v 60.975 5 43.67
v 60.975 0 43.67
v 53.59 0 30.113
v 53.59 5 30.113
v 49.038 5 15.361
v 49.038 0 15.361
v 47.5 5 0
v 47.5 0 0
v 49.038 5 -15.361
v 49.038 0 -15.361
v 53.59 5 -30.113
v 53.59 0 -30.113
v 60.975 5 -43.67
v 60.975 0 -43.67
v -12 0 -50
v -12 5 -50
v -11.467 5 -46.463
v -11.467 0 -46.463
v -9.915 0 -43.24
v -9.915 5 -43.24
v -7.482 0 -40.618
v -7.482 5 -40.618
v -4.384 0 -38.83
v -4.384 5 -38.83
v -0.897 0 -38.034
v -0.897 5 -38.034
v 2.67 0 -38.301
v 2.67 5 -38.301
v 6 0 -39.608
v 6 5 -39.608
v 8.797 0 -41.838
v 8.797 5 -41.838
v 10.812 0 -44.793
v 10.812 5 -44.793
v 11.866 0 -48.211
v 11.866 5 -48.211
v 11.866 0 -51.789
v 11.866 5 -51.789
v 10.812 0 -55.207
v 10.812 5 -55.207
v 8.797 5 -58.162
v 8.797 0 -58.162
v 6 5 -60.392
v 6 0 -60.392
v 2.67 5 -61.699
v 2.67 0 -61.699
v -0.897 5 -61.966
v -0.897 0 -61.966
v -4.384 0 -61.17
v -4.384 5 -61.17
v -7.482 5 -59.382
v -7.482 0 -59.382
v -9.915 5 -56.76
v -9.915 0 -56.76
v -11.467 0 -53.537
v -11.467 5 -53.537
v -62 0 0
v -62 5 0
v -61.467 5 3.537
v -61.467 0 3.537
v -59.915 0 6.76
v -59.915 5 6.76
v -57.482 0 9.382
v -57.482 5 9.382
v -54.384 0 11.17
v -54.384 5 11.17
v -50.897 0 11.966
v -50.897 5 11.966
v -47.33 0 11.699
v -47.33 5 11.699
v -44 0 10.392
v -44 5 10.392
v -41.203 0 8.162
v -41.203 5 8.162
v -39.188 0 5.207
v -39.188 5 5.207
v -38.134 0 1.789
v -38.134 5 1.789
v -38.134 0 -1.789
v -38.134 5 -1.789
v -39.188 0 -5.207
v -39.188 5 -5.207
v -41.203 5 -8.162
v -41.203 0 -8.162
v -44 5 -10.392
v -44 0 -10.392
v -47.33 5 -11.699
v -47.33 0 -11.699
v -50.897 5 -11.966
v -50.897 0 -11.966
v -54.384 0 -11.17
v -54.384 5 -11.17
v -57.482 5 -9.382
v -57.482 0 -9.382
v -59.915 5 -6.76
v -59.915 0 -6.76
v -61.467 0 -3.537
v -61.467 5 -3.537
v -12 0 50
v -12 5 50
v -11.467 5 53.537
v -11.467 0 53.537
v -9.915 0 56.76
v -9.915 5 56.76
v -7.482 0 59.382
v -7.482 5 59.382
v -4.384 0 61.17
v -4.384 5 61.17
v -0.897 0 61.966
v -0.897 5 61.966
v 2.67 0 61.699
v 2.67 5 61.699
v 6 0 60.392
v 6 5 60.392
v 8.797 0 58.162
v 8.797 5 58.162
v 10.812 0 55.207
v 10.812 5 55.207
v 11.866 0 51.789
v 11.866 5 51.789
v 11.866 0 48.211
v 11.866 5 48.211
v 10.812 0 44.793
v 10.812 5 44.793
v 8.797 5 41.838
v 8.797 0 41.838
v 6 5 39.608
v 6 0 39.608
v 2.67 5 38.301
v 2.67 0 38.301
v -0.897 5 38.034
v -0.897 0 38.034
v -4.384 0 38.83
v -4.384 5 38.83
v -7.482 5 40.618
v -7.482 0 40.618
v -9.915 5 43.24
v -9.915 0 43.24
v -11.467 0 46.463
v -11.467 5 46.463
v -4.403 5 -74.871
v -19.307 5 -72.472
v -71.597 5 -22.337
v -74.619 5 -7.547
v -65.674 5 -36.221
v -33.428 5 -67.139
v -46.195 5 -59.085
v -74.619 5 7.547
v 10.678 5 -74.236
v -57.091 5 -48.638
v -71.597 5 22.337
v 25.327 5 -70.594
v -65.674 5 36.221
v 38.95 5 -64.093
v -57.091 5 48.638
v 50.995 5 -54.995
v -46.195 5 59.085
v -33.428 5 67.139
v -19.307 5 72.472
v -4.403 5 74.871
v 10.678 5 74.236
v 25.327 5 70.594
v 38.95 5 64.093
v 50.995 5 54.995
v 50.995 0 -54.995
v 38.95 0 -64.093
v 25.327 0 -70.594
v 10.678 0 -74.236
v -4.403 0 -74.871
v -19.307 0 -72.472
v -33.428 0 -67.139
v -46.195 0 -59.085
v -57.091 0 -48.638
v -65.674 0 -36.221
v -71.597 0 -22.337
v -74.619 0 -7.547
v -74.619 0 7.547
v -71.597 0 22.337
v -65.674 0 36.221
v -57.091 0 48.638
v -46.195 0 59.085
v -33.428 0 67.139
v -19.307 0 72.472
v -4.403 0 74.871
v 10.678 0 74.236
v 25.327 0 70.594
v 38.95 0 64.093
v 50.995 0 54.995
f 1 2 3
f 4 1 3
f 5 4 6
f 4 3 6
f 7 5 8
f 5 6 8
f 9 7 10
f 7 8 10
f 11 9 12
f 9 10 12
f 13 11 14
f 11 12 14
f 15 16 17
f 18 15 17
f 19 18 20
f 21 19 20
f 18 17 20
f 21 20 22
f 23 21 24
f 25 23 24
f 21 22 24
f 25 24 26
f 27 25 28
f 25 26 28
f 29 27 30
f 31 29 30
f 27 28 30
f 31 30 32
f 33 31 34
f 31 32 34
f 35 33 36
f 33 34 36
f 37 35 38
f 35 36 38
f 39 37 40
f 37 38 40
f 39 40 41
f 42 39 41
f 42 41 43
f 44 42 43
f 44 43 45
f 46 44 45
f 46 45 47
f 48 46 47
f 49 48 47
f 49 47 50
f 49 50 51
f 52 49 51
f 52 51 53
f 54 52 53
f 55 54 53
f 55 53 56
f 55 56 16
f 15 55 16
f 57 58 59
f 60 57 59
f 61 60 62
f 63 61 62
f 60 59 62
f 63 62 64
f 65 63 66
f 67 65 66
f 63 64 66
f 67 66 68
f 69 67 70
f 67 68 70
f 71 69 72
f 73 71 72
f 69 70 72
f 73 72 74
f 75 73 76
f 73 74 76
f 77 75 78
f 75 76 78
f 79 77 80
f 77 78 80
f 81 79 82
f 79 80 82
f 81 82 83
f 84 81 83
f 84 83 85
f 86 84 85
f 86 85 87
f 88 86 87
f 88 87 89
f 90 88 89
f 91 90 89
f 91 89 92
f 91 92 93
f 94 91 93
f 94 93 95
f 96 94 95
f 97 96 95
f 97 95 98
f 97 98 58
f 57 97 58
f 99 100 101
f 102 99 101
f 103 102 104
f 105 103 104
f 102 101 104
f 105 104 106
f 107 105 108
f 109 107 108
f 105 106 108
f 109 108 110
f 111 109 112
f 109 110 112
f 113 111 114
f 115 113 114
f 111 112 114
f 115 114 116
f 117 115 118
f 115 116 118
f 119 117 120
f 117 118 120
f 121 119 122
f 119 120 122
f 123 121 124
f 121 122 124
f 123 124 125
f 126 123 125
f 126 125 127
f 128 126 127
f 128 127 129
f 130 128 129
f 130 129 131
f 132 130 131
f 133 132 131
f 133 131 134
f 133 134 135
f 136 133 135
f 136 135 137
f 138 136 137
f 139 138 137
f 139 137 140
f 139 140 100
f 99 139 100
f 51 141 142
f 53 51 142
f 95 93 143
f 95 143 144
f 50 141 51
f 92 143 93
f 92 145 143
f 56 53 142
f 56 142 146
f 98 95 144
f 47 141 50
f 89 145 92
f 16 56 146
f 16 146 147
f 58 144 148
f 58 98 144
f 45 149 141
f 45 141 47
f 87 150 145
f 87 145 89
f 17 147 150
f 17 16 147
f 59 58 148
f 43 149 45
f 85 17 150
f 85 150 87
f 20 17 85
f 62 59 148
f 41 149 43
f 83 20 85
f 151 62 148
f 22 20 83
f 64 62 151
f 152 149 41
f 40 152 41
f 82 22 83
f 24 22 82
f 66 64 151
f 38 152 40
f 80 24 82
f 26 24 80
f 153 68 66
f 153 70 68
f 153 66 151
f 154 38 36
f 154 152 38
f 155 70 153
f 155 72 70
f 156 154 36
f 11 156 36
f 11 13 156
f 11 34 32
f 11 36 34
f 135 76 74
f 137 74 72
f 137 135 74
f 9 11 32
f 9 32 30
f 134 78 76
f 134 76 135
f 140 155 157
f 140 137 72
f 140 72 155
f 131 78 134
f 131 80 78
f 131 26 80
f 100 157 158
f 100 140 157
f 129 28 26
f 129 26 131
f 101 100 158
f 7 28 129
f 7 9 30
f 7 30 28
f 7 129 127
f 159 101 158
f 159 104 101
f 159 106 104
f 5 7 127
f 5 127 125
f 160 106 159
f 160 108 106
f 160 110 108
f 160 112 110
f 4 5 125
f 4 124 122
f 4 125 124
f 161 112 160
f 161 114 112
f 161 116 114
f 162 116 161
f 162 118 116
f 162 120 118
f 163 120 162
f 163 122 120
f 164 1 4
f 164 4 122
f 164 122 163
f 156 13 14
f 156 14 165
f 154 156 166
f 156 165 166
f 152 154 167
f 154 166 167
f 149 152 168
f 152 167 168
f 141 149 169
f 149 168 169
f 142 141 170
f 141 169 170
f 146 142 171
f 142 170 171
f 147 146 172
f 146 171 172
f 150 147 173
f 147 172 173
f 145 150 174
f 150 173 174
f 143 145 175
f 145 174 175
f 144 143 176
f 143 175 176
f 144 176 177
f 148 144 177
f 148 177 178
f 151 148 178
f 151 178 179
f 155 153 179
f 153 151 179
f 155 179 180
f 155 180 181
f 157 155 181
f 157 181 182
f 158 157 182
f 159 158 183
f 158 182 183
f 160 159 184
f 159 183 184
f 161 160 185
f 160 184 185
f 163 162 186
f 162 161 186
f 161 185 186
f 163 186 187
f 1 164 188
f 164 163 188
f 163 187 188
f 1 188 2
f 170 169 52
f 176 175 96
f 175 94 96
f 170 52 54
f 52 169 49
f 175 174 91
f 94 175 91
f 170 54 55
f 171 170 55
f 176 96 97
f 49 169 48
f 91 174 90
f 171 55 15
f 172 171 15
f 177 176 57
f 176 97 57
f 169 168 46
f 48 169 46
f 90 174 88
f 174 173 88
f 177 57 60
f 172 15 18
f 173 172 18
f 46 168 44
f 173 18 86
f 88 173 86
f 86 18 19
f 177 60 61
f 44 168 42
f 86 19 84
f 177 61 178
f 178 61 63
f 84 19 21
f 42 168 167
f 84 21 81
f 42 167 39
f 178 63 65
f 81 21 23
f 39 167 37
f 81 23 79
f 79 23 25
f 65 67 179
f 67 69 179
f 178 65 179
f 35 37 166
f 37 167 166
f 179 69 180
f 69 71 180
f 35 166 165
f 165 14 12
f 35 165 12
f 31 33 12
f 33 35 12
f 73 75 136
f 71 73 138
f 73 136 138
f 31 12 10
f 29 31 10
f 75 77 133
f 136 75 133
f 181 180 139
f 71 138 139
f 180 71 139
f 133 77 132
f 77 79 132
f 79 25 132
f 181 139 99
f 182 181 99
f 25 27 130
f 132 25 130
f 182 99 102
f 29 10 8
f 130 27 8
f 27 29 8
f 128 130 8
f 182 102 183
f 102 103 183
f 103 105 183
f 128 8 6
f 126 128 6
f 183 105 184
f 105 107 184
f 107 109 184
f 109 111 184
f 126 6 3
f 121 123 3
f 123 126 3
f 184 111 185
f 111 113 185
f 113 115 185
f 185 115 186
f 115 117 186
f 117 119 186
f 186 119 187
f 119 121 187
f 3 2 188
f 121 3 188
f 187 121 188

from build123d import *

# Parameters (mm, degrees)
SKETCH_1_R          = 75
EXTRUDE_1_DEPTH     = 5
HOLE_WIZARD_1_D     = 24
SKETCH_4_R          = 77.5
CUT_EXTRUDE_1_DEPTH = 5


with BuildPart() as part:
    # 草图1 → 凸台-拉伸1 (new body)
    with BuildSketch(Plane(origin=(0, 0, 0), x_dir=(1, 0, 0), z_dir=(0, 1, 0))):
        with Locations(Location((0, 0, 0), (0, 0, 270))):
            Circle(SKETCH_1_R)
    extrude(amount=EXTRUDE_1_DEPTH)

    # 孔1 (through all)
    with Locations(Plane.XZ):
        with Locations((0, 50), (0, -50), (-50, 0)):
            Hole(HOLE_WIZARD_1_D / 2)

    # 草图4 → 切除-拉伸1 (cut)
    with BuildSketch(Plane.XZ):
        with Locations((125, 0)):
            Circle(SKETCH_4_R)
    extrude(amount=-CUT_EXTRUDE_1_DEPTH, mode=Mode.SUBTRACT)


solid = part.part
